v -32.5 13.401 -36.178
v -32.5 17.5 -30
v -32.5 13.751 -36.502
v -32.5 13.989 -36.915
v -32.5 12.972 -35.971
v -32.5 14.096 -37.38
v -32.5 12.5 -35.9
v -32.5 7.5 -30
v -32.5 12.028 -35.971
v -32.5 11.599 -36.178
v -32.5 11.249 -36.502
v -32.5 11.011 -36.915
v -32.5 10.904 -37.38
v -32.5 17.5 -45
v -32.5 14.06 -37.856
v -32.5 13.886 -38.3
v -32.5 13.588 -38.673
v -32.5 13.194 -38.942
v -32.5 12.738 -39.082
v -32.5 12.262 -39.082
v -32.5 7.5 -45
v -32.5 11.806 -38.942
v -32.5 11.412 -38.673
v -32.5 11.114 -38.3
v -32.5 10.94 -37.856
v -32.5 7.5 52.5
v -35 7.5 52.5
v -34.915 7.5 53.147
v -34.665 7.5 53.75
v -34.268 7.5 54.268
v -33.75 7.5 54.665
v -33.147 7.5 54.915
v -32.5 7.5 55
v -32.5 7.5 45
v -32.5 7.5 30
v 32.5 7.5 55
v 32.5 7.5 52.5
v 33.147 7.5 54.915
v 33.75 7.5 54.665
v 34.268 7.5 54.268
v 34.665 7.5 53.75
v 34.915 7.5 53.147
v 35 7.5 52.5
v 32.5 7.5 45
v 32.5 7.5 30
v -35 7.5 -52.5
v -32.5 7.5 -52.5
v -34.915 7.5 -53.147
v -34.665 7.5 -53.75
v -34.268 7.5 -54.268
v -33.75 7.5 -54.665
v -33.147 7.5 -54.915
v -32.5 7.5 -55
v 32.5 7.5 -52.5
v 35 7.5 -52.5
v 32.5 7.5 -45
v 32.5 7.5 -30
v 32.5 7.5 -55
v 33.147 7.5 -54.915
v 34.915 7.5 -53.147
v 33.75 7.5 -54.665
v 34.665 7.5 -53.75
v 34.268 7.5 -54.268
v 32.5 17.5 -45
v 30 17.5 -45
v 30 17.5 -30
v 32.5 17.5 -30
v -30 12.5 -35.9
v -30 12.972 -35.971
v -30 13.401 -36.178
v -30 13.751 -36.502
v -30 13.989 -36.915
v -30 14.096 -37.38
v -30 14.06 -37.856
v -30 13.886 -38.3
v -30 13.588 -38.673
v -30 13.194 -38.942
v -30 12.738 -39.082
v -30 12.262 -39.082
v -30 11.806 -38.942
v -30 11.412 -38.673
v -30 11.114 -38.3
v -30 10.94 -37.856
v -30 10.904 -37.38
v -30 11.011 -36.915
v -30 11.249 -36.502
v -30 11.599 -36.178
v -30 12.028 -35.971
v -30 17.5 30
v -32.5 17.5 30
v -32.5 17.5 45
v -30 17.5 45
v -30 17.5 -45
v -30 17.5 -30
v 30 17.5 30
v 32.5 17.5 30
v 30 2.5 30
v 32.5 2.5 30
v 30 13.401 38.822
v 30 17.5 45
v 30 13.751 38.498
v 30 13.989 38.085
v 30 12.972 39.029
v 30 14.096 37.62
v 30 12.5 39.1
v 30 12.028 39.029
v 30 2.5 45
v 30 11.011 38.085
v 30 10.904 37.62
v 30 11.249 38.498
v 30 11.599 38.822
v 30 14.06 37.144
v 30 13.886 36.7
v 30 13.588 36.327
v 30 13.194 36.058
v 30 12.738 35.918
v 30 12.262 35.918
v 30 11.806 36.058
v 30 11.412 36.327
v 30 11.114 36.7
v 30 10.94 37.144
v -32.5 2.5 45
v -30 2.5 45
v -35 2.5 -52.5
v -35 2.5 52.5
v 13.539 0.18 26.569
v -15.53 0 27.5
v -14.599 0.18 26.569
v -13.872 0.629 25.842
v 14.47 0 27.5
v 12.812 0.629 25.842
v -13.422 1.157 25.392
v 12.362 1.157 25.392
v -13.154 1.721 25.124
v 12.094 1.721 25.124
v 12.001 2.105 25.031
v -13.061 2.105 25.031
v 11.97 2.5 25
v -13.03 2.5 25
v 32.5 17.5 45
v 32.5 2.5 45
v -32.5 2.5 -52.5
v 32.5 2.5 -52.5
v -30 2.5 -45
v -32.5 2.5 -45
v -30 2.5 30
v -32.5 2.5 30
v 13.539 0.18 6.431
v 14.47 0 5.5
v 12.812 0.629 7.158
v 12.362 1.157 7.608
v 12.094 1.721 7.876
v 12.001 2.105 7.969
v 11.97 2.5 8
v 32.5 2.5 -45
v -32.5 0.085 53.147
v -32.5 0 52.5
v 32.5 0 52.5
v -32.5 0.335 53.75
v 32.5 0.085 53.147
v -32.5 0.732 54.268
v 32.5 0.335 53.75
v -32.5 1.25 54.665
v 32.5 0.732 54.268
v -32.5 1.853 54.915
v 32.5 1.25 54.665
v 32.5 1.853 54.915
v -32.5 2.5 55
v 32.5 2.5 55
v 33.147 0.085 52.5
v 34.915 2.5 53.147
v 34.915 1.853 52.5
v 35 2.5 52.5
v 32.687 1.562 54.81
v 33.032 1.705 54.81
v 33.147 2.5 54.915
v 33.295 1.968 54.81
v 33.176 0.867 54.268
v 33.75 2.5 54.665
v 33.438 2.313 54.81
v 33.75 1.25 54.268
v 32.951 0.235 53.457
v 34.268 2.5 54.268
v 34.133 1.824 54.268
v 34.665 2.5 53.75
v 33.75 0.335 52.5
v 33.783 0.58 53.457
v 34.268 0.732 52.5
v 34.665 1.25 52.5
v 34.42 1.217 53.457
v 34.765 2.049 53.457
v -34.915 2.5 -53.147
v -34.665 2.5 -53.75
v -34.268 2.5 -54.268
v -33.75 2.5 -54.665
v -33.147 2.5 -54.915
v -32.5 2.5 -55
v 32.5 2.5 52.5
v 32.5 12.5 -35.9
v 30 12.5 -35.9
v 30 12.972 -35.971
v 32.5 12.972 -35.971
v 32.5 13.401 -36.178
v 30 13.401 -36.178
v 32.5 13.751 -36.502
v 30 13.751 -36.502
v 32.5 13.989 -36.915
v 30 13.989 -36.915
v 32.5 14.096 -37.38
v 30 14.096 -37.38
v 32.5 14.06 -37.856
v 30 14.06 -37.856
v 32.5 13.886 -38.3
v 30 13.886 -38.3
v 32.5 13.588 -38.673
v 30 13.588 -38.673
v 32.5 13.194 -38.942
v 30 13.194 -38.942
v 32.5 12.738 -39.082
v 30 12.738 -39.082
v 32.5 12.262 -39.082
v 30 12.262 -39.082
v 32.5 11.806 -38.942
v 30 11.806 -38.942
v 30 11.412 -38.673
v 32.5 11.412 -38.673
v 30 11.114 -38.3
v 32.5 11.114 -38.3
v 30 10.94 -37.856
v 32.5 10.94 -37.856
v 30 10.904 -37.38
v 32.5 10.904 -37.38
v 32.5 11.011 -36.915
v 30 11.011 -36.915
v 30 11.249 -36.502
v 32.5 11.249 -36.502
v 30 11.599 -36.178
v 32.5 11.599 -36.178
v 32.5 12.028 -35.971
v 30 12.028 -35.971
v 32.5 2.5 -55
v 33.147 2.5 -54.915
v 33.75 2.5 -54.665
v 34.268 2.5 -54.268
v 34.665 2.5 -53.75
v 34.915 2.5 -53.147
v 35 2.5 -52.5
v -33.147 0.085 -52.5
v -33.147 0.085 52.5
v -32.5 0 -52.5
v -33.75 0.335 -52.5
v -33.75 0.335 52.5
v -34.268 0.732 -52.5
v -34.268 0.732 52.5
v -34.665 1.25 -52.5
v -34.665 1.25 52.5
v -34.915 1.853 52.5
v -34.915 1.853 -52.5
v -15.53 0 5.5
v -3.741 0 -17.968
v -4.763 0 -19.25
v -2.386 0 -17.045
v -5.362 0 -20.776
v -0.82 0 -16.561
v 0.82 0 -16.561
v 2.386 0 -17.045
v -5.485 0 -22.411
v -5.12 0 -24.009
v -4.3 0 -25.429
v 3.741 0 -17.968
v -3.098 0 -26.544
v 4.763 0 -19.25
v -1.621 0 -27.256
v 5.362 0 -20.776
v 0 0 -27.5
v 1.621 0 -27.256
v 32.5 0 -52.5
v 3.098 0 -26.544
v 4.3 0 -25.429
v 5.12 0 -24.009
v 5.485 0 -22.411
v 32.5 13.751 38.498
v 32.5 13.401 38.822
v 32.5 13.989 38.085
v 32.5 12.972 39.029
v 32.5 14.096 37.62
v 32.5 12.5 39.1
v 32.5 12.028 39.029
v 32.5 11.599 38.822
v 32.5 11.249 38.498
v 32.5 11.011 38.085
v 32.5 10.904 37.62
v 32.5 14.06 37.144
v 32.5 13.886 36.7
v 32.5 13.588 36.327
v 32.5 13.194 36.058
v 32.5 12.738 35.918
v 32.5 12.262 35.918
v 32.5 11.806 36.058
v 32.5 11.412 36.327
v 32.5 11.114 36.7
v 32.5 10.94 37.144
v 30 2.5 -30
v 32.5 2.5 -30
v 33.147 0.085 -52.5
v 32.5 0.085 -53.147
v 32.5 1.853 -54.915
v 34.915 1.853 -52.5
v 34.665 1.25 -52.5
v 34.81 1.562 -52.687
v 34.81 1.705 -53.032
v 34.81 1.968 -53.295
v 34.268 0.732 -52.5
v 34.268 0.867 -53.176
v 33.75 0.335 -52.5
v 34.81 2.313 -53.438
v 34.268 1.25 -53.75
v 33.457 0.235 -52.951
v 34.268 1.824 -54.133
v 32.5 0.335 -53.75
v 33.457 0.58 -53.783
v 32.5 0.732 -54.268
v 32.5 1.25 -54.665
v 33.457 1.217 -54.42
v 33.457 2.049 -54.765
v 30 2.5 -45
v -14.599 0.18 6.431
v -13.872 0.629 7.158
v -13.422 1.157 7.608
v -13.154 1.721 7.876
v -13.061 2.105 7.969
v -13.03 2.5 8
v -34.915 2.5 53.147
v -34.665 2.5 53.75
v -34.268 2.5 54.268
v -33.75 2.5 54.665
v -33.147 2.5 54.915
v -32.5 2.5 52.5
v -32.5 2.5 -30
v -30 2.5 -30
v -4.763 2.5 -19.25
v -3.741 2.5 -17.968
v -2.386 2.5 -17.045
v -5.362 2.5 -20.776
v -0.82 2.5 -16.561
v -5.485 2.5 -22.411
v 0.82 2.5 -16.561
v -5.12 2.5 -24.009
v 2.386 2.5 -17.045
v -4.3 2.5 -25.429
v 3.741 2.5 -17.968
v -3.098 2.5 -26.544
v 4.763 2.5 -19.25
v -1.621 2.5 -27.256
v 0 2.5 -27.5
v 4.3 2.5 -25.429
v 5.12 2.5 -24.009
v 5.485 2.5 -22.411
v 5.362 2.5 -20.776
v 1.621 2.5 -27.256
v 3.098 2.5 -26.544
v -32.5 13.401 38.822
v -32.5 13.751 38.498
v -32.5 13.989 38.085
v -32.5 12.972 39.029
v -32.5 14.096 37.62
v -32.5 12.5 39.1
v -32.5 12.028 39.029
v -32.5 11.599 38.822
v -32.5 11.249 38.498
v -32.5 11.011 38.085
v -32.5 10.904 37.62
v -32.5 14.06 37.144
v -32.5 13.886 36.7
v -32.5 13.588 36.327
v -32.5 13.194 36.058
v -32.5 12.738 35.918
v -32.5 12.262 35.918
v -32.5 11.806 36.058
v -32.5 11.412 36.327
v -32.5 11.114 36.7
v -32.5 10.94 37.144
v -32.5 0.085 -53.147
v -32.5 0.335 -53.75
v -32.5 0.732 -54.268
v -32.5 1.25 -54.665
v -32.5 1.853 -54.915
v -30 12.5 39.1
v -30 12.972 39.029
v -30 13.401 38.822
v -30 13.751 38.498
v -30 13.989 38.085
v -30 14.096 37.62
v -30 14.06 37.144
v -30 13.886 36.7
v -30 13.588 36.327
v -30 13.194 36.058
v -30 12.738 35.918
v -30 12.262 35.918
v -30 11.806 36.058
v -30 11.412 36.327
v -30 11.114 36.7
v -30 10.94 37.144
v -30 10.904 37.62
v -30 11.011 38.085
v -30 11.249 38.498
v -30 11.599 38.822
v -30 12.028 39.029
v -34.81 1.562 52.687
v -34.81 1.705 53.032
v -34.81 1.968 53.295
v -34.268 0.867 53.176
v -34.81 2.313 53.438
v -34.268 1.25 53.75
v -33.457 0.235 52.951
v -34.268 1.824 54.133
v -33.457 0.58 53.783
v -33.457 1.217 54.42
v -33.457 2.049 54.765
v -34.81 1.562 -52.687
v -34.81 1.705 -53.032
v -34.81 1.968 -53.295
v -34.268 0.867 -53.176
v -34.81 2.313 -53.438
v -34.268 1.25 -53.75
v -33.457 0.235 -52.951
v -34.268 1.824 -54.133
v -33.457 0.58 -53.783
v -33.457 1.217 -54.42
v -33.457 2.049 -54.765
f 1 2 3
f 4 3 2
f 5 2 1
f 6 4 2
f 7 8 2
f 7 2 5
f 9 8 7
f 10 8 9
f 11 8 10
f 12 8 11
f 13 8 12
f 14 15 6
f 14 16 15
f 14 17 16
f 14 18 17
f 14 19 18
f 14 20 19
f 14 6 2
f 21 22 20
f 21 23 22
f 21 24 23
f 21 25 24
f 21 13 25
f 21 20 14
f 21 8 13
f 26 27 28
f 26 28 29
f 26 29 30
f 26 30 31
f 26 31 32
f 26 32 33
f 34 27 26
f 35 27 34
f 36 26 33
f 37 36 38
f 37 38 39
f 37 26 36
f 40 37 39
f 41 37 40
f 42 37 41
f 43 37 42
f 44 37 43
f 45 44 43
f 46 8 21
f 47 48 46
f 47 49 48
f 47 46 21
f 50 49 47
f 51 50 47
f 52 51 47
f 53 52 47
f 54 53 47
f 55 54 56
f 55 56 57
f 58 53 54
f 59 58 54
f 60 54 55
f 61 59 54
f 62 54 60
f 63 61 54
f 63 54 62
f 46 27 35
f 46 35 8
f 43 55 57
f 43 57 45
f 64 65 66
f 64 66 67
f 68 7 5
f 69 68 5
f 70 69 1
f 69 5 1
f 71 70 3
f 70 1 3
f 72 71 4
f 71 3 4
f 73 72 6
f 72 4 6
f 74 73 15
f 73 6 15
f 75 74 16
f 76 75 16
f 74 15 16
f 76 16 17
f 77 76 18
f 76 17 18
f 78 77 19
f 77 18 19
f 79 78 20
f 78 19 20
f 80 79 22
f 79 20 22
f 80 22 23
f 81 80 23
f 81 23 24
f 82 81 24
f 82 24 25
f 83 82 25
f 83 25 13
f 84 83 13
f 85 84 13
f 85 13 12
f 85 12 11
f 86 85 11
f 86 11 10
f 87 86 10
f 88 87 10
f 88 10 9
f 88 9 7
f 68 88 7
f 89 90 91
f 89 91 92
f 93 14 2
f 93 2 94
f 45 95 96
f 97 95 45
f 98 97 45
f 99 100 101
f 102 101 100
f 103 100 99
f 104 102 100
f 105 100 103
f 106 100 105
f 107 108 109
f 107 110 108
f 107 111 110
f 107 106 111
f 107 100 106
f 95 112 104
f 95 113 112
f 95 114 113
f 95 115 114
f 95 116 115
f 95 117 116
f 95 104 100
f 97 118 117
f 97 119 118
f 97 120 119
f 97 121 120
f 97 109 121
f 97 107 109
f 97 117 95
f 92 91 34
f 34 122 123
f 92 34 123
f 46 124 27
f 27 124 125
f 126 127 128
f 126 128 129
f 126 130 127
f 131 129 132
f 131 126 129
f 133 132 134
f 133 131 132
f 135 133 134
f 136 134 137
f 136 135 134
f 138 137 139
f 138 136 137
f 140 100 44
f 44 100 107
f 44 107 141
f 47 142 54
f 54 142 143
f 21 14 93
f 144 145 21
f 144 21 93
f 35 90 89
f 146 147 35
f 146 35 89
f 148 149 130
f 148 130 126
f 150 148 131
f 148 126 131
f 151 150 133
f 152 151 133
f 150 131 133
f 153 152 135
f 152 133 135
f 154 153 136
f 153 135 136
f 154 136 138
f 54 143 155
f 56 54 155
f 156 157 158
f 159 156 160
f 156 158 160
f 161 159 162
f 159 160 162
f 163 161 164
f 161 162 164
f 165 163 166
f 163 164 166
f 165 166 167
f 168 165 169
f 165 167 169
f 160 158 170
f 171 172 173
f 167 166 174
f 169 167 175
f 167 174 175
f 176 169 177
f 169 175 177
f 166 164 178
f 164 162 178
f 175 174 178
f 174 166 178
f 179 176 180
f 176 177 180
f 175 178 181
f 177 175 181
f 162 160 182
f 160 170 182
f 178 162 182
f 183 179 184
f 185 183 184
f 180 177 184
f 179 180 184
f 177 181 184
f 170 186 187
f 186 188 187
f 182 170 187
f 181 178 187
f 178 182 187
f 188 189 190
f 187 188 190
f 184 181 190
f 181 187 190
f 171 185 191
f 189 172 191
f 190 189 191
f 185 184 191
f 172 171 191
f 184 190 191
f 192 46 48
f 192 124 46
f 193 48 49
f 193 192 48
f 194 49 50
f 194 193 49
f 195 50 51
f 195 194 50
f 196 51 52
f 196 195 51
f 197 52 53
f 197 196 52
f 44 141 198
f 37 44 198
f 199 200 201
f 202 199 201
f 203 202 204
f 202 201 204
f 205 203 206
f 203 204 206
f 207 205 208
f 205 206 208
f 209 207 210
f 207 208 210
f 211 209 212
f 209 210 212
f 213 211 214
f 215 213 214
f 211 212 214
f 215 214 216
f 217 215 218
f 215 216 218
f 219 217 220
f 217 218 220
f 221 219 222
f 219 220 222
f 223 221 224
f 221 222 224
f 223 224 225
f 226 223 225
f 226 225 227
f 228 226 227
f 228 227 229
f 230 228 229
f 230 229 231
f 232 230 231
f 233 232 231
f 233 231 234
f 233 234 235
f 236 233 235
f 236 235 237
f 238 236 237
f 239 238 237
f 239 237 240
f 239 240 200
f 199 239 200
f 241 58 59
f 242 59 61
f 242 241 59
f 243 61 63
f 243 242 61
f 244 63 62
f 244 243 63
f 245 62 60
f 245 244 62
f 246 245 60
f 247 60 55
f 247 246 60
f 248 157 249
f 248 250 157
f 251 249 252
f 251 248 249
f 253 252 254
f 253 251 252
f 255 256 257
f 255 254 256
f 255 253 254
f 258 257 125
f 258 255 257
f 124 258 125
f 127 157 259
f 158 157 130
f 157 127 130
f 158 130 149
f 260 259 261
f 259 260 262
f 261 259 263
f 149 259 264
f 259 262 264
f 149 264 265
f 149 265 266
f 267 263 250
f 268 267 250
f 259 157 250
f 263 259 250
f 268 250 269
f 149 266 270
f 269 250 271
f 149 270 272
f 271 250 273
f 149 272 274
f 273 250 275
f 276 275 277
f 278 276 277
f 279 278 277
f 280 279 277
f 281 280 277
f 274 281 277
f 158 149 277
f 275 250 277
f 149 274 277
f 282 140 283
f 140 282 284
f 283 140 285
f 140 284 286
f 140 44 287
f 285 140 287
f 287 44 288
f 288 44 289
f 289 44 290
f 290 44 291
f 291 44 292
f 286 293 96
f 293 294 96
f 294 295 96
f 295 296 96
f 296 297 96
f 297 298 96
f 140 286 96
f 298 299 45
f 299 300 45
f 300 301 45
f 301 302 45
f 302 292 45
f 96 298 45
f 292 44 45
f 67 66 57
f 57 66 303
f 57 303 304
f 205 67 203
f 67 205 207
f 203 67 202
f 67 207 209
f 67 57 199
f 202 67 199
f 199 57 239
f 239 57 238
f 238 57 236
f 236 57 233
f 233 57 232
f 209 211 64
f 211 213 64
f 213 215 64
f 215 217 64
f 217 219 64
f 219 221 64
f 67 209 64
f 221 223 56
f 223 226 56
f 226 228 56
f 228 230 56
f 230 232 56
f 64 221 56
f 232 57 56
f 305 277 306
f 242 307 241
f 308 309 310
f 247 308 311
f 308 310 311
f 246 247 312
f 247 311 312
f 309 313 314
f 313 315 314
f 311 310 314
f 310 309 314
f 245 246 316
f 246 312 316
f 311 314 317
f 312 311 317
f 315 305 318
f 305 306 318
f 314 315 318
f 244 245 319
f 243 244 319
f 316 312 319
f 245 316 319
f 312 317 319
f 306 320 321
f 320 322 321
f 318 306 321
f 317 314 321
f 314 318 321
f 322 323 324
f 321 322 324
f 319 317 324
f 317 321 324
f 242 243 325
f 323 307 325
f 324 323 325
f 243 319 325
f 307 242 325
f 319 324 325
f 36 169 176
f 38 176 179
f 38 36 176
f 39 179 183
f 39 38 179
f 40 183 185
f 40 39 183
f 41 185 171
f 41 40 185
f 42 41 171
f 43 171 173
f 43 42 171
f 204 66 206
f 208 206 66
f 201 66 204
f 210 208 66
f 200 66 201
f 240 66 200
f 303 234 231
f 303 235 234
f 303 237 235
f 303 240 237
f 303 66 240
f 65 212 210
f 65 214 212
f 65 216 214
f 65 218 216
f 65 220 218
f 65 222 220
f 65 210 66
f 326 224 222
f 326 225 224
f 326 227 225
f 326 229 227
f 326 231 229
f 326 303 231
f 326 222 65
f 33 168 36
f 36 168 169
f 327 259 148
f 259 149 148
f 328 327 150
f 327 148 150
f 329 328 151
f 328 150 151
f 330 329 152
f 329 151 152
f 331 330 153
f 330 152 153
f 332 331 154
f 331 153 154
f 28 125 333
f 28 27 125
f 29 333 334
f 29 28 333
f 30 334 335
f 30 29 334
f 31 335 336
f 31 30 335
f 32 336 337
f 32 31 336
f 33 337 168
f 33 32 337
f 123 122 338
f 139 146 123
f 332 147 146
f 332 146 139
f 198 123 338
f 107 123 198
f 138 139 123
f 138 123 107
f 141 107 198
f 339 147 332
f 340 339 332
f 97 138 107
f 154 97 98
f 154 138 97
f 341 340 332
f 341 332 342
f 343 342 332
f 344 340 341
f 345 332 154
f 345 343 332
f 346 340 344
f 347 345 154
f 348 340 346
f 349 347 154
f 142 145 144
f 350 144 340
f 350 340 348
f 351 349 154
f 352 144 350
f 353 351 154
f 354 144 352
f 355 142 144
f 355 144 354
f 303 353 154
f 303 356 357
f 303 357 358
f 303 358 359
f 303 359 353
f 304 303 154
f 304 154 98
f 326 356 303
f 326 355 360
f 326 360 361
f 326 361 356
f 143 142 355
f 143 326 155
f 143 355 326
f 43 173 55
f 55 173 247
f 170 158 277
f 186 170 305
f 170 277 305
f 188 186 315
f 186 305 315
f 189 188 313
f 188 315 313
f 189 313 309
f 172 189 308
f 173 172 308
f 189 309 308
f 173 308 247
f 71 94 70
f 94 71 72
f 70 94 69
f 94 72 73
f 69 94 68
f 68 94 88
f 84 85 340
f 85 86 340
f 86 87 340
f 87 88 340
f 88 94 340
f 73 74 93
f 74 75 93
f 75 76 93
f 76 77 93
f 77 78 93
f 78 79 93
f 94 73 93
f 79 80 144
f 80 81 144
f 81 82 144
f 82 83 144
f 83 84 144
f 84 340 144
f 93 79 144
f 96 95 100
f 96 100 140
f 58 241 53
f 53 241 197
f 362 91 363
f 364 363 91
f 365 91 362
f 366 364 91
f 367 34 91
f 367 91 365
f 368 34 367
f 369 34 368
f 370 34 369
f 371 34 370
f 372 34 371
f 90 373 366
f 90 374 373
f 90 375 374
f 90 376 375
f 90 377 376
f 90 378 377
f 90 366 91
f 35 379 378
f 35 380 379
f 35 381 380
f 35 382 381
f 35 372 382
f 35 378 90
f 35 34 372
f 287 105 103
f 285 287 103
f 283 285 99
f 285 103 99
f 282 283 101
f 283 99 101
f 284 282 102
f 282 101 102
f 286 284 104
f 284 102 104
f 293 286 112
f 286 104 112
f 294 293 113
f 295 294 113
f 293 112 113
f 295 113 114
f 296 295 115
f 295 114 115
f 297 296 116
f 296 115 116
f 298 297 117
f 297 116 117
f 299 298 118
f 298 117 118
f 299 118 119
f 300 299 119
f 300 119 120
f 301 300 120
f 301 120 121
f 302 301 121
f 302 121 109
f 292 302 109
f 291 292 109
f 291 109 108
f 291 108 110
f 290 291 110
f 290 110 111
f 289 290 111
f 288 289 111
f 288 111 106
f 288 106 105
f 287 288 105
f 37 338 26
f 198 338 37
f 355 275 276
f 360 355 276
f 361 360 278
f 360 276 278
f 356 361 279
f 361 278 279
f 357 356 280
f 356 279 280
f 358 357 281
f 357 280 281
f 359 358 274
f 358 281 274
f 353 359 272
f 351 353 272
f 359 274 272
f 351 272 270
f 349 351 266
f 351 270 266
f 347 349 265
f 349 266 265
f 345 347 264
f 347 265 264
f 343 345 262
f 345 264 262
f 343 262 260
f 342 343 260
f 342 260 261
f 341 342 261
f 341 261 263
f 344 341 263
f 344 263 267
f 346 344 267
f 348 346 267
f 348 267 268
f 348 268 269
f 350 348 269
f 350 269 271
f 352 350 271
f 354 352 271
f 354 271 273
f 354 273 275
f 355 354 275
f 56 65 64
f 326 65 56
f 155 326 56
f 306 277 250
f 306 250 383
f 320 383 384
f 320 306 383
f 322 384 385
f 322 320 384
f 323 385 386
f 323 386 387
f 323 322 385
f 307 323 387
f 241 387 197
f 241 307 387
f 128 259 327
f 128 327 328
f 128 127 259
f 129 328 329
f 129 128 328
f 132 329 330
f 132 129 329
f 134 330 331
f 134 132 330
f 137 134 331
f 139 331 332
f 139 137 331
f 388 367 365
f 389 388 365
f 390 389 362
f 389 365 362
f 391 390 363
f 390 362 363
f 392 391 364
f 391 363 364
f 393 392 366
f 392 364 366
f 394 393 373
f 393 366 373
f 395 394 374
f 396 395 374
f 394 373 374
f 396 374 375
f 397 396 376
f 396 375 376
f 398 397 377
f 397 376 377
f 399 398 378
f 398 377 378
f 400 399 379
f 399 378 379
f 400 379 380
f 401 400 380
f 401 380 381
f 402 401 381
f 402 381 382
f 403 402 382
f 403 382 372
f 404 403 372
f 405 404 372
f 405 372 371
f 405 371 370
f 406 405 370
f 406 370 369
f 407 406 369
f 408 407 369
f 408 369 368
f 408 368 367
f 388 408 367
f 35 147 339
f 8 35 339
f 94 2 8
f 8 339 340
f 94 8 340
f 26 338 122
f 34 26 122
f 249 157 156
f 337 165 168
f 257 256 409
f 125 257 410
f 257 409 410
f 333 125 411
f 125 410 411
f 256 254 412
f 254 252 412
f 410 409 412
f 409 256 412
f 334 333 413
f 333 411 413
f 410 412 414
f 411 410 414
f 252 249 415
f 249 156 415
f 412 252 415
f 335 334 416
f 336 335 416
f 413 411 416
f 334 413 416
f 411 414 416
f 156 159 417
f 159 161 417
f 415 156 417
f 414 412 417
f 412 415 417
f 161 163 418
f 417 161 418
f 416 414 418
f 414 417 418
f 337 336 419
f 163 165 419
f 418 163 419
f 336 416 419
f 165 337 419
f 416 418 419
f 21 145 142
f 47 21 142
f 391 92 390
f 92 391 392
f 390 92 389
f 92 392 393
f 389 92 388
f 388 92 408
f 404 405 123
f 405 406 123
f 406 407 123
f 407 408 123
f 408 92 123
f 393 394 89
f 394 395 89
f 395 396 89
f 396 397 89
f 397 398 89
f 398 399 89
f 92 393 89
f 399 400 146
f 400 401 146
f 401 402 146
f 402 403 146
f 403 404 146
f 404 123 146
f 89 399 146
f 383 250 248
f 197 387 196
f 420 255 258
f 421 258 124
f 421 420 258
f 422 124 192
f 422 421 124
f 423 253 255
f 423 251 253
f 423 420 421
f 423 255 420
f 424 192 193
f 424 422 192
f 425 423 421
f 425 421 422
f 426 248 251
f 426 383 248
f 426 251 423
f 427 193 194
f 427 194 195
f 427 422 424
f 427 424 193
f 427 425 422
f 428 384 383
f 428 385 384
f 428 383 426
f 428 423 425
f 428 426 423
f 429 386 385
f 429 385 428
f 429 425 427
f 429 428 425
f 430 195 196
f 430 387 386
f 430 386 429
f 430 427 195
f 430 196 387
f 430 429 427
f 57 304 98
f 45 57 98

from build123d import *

# Parameters (mm, degrees)
SKETCH2_W           = 70
SKETCH2_H           = 110
BOSS_EXTRUDE1_DEPTH = 2.5
SKETCH3_W           = 65
SKETCH3_H           = 2.5
BOSS_EXTRUDE2_DEPTH = 5
SKETCH4_W           = 2.5
SKETCH4_H           = 15
BOSS_EXTRUDE3_DEPTH = 15
SKETCH6_R           = 1.6
CUT_EXTRUDE1_DEPTH  = 89.811598342
SKETCH7_W           = 25
SKETCH7_H           = 17
SKETCH7_R           = 5.5
CUT_EXTRUDE2_DEPTH  = 68.5
FILLET1_R           = 2.5
FILLET2_R           = 2.5


with BuildPart() as part:
    # Sketch2 → Boss-Extrude1 (new body)
    with BuildSketch(Plane(origin=(0, 0, 0), x_dir=(1, 0, 0), z_dir=(0, 1, 0))):
        Rectangle(SKETCH2_W, SKETCH2_H)
    extrude(amount=BOSS_EXTRUDE1_DEPTH)

    # Sketch3 → Boss-Extrude2 (add)
    with BuildSketch(Plane(origin=(0, 2.5, 0), x_dir=(1, 0, 0), z_dir=(0, 1, 0))):
        Polygon((-35, 55), (-35, -55), (-32.5, -55), (-32.5, -52.5), (-32.5, 52.5), (-32.5, 55), align=None)
        Polygon((35, 55), (-32.5, 55), (-32.5, 52.5), (32.5, 52.5), (35, 52.5), align=None)
        Polygon((32.5, -52.5), (32.5, -55), (35, -55), (35, 52.5), (32.5, 52.5), align=None)
        with Locations((0, -53.75)):
            Rectangle(SKETCH3_W, SKETCH3_H)
    extrude(amount=BOSS_EXTRUDE2_DEPTH)

    # Sketch4 → Boss-Extrude3 (add)
    with BuildSketch(Plane(origin=(0, 2.5, 0), x_dir=(1, 0, 0), z_dir=(0, 1, 0))):
        with Locations((-31.25, 37.5)):
            Rectangle(SKETCH4_W, SKETCH4_H)
        with Locations((31.25, 37.5)):
            Rectangle(SKETCH4_W, SKETCH4_H)
        with Locations((31.25, -37.5)):
            Rectangle(SKETCH4_W, SKETCH4_H)
        with Locations((-31.25, -37.5)):
            Rectangle(SKETCH4_W, SKETCH4_H)
    extrude(amount=BOSS_EXTRUDE3_DEPTH)

    # Sketch6 → Cut-Extrude1 (cut, through all)
    with BuildSketch(Plane.ZY.offset(32.5)):
        with Locations((-37.5, 12.5)):
            Circle(SKETCH6_R)
        with Locations((37.5, 12.5)):
            Circle(SKETCH6_R)
    extrude(amount=-CUT_EXTRUDE1_DEPTH, mode=Mode.SUBTRACT)

    # Sketch7 → Cut-Extrude2 (cut, through all)
    with BuildSketch(Plane.XZ):
        with Locations((-0.53, 16.5)):
            Rectangle(SKETCH7_W, SKETCH7_H)
        with Locations(Location((0, -22, 0), (0, 0, 270))):
            Circle(SKETCH7_R)
    extrude(amount=-CUT_EXTRUDE2_DEPTH, mode=Mode.SUBTRACT)

    # Fillet1
    fillet1_edges = [part.edges().sort_by_distance(p)[0] for p in [
        (-0.53, 0, 25),
        (11.97, 0, 16.5),
        (-0.53, 0, 8),
        (-13.03, 0, 16.5),
    ]]
    fillet(fillet1_edges, radius=FILLET1_R - 0.0001)  # a hair under: the kernel refuses the full size

    # Fillet2
    fillet2_edges = [part.edges().sort_by_distance(p)[0] for p in [
        (0, 0, -55),
        (35, 0, 0),
        (0, 0, 55),
        (-35, 0, 0),
        (-35, 3.75, -55),
        (35, 3.75, -55),
        (35, 3.75, 55),
        (-35, 3.75, 55),
    ]]
    fillet(fillet2_edges, radius=FILLET2_R)


solid = part.part
